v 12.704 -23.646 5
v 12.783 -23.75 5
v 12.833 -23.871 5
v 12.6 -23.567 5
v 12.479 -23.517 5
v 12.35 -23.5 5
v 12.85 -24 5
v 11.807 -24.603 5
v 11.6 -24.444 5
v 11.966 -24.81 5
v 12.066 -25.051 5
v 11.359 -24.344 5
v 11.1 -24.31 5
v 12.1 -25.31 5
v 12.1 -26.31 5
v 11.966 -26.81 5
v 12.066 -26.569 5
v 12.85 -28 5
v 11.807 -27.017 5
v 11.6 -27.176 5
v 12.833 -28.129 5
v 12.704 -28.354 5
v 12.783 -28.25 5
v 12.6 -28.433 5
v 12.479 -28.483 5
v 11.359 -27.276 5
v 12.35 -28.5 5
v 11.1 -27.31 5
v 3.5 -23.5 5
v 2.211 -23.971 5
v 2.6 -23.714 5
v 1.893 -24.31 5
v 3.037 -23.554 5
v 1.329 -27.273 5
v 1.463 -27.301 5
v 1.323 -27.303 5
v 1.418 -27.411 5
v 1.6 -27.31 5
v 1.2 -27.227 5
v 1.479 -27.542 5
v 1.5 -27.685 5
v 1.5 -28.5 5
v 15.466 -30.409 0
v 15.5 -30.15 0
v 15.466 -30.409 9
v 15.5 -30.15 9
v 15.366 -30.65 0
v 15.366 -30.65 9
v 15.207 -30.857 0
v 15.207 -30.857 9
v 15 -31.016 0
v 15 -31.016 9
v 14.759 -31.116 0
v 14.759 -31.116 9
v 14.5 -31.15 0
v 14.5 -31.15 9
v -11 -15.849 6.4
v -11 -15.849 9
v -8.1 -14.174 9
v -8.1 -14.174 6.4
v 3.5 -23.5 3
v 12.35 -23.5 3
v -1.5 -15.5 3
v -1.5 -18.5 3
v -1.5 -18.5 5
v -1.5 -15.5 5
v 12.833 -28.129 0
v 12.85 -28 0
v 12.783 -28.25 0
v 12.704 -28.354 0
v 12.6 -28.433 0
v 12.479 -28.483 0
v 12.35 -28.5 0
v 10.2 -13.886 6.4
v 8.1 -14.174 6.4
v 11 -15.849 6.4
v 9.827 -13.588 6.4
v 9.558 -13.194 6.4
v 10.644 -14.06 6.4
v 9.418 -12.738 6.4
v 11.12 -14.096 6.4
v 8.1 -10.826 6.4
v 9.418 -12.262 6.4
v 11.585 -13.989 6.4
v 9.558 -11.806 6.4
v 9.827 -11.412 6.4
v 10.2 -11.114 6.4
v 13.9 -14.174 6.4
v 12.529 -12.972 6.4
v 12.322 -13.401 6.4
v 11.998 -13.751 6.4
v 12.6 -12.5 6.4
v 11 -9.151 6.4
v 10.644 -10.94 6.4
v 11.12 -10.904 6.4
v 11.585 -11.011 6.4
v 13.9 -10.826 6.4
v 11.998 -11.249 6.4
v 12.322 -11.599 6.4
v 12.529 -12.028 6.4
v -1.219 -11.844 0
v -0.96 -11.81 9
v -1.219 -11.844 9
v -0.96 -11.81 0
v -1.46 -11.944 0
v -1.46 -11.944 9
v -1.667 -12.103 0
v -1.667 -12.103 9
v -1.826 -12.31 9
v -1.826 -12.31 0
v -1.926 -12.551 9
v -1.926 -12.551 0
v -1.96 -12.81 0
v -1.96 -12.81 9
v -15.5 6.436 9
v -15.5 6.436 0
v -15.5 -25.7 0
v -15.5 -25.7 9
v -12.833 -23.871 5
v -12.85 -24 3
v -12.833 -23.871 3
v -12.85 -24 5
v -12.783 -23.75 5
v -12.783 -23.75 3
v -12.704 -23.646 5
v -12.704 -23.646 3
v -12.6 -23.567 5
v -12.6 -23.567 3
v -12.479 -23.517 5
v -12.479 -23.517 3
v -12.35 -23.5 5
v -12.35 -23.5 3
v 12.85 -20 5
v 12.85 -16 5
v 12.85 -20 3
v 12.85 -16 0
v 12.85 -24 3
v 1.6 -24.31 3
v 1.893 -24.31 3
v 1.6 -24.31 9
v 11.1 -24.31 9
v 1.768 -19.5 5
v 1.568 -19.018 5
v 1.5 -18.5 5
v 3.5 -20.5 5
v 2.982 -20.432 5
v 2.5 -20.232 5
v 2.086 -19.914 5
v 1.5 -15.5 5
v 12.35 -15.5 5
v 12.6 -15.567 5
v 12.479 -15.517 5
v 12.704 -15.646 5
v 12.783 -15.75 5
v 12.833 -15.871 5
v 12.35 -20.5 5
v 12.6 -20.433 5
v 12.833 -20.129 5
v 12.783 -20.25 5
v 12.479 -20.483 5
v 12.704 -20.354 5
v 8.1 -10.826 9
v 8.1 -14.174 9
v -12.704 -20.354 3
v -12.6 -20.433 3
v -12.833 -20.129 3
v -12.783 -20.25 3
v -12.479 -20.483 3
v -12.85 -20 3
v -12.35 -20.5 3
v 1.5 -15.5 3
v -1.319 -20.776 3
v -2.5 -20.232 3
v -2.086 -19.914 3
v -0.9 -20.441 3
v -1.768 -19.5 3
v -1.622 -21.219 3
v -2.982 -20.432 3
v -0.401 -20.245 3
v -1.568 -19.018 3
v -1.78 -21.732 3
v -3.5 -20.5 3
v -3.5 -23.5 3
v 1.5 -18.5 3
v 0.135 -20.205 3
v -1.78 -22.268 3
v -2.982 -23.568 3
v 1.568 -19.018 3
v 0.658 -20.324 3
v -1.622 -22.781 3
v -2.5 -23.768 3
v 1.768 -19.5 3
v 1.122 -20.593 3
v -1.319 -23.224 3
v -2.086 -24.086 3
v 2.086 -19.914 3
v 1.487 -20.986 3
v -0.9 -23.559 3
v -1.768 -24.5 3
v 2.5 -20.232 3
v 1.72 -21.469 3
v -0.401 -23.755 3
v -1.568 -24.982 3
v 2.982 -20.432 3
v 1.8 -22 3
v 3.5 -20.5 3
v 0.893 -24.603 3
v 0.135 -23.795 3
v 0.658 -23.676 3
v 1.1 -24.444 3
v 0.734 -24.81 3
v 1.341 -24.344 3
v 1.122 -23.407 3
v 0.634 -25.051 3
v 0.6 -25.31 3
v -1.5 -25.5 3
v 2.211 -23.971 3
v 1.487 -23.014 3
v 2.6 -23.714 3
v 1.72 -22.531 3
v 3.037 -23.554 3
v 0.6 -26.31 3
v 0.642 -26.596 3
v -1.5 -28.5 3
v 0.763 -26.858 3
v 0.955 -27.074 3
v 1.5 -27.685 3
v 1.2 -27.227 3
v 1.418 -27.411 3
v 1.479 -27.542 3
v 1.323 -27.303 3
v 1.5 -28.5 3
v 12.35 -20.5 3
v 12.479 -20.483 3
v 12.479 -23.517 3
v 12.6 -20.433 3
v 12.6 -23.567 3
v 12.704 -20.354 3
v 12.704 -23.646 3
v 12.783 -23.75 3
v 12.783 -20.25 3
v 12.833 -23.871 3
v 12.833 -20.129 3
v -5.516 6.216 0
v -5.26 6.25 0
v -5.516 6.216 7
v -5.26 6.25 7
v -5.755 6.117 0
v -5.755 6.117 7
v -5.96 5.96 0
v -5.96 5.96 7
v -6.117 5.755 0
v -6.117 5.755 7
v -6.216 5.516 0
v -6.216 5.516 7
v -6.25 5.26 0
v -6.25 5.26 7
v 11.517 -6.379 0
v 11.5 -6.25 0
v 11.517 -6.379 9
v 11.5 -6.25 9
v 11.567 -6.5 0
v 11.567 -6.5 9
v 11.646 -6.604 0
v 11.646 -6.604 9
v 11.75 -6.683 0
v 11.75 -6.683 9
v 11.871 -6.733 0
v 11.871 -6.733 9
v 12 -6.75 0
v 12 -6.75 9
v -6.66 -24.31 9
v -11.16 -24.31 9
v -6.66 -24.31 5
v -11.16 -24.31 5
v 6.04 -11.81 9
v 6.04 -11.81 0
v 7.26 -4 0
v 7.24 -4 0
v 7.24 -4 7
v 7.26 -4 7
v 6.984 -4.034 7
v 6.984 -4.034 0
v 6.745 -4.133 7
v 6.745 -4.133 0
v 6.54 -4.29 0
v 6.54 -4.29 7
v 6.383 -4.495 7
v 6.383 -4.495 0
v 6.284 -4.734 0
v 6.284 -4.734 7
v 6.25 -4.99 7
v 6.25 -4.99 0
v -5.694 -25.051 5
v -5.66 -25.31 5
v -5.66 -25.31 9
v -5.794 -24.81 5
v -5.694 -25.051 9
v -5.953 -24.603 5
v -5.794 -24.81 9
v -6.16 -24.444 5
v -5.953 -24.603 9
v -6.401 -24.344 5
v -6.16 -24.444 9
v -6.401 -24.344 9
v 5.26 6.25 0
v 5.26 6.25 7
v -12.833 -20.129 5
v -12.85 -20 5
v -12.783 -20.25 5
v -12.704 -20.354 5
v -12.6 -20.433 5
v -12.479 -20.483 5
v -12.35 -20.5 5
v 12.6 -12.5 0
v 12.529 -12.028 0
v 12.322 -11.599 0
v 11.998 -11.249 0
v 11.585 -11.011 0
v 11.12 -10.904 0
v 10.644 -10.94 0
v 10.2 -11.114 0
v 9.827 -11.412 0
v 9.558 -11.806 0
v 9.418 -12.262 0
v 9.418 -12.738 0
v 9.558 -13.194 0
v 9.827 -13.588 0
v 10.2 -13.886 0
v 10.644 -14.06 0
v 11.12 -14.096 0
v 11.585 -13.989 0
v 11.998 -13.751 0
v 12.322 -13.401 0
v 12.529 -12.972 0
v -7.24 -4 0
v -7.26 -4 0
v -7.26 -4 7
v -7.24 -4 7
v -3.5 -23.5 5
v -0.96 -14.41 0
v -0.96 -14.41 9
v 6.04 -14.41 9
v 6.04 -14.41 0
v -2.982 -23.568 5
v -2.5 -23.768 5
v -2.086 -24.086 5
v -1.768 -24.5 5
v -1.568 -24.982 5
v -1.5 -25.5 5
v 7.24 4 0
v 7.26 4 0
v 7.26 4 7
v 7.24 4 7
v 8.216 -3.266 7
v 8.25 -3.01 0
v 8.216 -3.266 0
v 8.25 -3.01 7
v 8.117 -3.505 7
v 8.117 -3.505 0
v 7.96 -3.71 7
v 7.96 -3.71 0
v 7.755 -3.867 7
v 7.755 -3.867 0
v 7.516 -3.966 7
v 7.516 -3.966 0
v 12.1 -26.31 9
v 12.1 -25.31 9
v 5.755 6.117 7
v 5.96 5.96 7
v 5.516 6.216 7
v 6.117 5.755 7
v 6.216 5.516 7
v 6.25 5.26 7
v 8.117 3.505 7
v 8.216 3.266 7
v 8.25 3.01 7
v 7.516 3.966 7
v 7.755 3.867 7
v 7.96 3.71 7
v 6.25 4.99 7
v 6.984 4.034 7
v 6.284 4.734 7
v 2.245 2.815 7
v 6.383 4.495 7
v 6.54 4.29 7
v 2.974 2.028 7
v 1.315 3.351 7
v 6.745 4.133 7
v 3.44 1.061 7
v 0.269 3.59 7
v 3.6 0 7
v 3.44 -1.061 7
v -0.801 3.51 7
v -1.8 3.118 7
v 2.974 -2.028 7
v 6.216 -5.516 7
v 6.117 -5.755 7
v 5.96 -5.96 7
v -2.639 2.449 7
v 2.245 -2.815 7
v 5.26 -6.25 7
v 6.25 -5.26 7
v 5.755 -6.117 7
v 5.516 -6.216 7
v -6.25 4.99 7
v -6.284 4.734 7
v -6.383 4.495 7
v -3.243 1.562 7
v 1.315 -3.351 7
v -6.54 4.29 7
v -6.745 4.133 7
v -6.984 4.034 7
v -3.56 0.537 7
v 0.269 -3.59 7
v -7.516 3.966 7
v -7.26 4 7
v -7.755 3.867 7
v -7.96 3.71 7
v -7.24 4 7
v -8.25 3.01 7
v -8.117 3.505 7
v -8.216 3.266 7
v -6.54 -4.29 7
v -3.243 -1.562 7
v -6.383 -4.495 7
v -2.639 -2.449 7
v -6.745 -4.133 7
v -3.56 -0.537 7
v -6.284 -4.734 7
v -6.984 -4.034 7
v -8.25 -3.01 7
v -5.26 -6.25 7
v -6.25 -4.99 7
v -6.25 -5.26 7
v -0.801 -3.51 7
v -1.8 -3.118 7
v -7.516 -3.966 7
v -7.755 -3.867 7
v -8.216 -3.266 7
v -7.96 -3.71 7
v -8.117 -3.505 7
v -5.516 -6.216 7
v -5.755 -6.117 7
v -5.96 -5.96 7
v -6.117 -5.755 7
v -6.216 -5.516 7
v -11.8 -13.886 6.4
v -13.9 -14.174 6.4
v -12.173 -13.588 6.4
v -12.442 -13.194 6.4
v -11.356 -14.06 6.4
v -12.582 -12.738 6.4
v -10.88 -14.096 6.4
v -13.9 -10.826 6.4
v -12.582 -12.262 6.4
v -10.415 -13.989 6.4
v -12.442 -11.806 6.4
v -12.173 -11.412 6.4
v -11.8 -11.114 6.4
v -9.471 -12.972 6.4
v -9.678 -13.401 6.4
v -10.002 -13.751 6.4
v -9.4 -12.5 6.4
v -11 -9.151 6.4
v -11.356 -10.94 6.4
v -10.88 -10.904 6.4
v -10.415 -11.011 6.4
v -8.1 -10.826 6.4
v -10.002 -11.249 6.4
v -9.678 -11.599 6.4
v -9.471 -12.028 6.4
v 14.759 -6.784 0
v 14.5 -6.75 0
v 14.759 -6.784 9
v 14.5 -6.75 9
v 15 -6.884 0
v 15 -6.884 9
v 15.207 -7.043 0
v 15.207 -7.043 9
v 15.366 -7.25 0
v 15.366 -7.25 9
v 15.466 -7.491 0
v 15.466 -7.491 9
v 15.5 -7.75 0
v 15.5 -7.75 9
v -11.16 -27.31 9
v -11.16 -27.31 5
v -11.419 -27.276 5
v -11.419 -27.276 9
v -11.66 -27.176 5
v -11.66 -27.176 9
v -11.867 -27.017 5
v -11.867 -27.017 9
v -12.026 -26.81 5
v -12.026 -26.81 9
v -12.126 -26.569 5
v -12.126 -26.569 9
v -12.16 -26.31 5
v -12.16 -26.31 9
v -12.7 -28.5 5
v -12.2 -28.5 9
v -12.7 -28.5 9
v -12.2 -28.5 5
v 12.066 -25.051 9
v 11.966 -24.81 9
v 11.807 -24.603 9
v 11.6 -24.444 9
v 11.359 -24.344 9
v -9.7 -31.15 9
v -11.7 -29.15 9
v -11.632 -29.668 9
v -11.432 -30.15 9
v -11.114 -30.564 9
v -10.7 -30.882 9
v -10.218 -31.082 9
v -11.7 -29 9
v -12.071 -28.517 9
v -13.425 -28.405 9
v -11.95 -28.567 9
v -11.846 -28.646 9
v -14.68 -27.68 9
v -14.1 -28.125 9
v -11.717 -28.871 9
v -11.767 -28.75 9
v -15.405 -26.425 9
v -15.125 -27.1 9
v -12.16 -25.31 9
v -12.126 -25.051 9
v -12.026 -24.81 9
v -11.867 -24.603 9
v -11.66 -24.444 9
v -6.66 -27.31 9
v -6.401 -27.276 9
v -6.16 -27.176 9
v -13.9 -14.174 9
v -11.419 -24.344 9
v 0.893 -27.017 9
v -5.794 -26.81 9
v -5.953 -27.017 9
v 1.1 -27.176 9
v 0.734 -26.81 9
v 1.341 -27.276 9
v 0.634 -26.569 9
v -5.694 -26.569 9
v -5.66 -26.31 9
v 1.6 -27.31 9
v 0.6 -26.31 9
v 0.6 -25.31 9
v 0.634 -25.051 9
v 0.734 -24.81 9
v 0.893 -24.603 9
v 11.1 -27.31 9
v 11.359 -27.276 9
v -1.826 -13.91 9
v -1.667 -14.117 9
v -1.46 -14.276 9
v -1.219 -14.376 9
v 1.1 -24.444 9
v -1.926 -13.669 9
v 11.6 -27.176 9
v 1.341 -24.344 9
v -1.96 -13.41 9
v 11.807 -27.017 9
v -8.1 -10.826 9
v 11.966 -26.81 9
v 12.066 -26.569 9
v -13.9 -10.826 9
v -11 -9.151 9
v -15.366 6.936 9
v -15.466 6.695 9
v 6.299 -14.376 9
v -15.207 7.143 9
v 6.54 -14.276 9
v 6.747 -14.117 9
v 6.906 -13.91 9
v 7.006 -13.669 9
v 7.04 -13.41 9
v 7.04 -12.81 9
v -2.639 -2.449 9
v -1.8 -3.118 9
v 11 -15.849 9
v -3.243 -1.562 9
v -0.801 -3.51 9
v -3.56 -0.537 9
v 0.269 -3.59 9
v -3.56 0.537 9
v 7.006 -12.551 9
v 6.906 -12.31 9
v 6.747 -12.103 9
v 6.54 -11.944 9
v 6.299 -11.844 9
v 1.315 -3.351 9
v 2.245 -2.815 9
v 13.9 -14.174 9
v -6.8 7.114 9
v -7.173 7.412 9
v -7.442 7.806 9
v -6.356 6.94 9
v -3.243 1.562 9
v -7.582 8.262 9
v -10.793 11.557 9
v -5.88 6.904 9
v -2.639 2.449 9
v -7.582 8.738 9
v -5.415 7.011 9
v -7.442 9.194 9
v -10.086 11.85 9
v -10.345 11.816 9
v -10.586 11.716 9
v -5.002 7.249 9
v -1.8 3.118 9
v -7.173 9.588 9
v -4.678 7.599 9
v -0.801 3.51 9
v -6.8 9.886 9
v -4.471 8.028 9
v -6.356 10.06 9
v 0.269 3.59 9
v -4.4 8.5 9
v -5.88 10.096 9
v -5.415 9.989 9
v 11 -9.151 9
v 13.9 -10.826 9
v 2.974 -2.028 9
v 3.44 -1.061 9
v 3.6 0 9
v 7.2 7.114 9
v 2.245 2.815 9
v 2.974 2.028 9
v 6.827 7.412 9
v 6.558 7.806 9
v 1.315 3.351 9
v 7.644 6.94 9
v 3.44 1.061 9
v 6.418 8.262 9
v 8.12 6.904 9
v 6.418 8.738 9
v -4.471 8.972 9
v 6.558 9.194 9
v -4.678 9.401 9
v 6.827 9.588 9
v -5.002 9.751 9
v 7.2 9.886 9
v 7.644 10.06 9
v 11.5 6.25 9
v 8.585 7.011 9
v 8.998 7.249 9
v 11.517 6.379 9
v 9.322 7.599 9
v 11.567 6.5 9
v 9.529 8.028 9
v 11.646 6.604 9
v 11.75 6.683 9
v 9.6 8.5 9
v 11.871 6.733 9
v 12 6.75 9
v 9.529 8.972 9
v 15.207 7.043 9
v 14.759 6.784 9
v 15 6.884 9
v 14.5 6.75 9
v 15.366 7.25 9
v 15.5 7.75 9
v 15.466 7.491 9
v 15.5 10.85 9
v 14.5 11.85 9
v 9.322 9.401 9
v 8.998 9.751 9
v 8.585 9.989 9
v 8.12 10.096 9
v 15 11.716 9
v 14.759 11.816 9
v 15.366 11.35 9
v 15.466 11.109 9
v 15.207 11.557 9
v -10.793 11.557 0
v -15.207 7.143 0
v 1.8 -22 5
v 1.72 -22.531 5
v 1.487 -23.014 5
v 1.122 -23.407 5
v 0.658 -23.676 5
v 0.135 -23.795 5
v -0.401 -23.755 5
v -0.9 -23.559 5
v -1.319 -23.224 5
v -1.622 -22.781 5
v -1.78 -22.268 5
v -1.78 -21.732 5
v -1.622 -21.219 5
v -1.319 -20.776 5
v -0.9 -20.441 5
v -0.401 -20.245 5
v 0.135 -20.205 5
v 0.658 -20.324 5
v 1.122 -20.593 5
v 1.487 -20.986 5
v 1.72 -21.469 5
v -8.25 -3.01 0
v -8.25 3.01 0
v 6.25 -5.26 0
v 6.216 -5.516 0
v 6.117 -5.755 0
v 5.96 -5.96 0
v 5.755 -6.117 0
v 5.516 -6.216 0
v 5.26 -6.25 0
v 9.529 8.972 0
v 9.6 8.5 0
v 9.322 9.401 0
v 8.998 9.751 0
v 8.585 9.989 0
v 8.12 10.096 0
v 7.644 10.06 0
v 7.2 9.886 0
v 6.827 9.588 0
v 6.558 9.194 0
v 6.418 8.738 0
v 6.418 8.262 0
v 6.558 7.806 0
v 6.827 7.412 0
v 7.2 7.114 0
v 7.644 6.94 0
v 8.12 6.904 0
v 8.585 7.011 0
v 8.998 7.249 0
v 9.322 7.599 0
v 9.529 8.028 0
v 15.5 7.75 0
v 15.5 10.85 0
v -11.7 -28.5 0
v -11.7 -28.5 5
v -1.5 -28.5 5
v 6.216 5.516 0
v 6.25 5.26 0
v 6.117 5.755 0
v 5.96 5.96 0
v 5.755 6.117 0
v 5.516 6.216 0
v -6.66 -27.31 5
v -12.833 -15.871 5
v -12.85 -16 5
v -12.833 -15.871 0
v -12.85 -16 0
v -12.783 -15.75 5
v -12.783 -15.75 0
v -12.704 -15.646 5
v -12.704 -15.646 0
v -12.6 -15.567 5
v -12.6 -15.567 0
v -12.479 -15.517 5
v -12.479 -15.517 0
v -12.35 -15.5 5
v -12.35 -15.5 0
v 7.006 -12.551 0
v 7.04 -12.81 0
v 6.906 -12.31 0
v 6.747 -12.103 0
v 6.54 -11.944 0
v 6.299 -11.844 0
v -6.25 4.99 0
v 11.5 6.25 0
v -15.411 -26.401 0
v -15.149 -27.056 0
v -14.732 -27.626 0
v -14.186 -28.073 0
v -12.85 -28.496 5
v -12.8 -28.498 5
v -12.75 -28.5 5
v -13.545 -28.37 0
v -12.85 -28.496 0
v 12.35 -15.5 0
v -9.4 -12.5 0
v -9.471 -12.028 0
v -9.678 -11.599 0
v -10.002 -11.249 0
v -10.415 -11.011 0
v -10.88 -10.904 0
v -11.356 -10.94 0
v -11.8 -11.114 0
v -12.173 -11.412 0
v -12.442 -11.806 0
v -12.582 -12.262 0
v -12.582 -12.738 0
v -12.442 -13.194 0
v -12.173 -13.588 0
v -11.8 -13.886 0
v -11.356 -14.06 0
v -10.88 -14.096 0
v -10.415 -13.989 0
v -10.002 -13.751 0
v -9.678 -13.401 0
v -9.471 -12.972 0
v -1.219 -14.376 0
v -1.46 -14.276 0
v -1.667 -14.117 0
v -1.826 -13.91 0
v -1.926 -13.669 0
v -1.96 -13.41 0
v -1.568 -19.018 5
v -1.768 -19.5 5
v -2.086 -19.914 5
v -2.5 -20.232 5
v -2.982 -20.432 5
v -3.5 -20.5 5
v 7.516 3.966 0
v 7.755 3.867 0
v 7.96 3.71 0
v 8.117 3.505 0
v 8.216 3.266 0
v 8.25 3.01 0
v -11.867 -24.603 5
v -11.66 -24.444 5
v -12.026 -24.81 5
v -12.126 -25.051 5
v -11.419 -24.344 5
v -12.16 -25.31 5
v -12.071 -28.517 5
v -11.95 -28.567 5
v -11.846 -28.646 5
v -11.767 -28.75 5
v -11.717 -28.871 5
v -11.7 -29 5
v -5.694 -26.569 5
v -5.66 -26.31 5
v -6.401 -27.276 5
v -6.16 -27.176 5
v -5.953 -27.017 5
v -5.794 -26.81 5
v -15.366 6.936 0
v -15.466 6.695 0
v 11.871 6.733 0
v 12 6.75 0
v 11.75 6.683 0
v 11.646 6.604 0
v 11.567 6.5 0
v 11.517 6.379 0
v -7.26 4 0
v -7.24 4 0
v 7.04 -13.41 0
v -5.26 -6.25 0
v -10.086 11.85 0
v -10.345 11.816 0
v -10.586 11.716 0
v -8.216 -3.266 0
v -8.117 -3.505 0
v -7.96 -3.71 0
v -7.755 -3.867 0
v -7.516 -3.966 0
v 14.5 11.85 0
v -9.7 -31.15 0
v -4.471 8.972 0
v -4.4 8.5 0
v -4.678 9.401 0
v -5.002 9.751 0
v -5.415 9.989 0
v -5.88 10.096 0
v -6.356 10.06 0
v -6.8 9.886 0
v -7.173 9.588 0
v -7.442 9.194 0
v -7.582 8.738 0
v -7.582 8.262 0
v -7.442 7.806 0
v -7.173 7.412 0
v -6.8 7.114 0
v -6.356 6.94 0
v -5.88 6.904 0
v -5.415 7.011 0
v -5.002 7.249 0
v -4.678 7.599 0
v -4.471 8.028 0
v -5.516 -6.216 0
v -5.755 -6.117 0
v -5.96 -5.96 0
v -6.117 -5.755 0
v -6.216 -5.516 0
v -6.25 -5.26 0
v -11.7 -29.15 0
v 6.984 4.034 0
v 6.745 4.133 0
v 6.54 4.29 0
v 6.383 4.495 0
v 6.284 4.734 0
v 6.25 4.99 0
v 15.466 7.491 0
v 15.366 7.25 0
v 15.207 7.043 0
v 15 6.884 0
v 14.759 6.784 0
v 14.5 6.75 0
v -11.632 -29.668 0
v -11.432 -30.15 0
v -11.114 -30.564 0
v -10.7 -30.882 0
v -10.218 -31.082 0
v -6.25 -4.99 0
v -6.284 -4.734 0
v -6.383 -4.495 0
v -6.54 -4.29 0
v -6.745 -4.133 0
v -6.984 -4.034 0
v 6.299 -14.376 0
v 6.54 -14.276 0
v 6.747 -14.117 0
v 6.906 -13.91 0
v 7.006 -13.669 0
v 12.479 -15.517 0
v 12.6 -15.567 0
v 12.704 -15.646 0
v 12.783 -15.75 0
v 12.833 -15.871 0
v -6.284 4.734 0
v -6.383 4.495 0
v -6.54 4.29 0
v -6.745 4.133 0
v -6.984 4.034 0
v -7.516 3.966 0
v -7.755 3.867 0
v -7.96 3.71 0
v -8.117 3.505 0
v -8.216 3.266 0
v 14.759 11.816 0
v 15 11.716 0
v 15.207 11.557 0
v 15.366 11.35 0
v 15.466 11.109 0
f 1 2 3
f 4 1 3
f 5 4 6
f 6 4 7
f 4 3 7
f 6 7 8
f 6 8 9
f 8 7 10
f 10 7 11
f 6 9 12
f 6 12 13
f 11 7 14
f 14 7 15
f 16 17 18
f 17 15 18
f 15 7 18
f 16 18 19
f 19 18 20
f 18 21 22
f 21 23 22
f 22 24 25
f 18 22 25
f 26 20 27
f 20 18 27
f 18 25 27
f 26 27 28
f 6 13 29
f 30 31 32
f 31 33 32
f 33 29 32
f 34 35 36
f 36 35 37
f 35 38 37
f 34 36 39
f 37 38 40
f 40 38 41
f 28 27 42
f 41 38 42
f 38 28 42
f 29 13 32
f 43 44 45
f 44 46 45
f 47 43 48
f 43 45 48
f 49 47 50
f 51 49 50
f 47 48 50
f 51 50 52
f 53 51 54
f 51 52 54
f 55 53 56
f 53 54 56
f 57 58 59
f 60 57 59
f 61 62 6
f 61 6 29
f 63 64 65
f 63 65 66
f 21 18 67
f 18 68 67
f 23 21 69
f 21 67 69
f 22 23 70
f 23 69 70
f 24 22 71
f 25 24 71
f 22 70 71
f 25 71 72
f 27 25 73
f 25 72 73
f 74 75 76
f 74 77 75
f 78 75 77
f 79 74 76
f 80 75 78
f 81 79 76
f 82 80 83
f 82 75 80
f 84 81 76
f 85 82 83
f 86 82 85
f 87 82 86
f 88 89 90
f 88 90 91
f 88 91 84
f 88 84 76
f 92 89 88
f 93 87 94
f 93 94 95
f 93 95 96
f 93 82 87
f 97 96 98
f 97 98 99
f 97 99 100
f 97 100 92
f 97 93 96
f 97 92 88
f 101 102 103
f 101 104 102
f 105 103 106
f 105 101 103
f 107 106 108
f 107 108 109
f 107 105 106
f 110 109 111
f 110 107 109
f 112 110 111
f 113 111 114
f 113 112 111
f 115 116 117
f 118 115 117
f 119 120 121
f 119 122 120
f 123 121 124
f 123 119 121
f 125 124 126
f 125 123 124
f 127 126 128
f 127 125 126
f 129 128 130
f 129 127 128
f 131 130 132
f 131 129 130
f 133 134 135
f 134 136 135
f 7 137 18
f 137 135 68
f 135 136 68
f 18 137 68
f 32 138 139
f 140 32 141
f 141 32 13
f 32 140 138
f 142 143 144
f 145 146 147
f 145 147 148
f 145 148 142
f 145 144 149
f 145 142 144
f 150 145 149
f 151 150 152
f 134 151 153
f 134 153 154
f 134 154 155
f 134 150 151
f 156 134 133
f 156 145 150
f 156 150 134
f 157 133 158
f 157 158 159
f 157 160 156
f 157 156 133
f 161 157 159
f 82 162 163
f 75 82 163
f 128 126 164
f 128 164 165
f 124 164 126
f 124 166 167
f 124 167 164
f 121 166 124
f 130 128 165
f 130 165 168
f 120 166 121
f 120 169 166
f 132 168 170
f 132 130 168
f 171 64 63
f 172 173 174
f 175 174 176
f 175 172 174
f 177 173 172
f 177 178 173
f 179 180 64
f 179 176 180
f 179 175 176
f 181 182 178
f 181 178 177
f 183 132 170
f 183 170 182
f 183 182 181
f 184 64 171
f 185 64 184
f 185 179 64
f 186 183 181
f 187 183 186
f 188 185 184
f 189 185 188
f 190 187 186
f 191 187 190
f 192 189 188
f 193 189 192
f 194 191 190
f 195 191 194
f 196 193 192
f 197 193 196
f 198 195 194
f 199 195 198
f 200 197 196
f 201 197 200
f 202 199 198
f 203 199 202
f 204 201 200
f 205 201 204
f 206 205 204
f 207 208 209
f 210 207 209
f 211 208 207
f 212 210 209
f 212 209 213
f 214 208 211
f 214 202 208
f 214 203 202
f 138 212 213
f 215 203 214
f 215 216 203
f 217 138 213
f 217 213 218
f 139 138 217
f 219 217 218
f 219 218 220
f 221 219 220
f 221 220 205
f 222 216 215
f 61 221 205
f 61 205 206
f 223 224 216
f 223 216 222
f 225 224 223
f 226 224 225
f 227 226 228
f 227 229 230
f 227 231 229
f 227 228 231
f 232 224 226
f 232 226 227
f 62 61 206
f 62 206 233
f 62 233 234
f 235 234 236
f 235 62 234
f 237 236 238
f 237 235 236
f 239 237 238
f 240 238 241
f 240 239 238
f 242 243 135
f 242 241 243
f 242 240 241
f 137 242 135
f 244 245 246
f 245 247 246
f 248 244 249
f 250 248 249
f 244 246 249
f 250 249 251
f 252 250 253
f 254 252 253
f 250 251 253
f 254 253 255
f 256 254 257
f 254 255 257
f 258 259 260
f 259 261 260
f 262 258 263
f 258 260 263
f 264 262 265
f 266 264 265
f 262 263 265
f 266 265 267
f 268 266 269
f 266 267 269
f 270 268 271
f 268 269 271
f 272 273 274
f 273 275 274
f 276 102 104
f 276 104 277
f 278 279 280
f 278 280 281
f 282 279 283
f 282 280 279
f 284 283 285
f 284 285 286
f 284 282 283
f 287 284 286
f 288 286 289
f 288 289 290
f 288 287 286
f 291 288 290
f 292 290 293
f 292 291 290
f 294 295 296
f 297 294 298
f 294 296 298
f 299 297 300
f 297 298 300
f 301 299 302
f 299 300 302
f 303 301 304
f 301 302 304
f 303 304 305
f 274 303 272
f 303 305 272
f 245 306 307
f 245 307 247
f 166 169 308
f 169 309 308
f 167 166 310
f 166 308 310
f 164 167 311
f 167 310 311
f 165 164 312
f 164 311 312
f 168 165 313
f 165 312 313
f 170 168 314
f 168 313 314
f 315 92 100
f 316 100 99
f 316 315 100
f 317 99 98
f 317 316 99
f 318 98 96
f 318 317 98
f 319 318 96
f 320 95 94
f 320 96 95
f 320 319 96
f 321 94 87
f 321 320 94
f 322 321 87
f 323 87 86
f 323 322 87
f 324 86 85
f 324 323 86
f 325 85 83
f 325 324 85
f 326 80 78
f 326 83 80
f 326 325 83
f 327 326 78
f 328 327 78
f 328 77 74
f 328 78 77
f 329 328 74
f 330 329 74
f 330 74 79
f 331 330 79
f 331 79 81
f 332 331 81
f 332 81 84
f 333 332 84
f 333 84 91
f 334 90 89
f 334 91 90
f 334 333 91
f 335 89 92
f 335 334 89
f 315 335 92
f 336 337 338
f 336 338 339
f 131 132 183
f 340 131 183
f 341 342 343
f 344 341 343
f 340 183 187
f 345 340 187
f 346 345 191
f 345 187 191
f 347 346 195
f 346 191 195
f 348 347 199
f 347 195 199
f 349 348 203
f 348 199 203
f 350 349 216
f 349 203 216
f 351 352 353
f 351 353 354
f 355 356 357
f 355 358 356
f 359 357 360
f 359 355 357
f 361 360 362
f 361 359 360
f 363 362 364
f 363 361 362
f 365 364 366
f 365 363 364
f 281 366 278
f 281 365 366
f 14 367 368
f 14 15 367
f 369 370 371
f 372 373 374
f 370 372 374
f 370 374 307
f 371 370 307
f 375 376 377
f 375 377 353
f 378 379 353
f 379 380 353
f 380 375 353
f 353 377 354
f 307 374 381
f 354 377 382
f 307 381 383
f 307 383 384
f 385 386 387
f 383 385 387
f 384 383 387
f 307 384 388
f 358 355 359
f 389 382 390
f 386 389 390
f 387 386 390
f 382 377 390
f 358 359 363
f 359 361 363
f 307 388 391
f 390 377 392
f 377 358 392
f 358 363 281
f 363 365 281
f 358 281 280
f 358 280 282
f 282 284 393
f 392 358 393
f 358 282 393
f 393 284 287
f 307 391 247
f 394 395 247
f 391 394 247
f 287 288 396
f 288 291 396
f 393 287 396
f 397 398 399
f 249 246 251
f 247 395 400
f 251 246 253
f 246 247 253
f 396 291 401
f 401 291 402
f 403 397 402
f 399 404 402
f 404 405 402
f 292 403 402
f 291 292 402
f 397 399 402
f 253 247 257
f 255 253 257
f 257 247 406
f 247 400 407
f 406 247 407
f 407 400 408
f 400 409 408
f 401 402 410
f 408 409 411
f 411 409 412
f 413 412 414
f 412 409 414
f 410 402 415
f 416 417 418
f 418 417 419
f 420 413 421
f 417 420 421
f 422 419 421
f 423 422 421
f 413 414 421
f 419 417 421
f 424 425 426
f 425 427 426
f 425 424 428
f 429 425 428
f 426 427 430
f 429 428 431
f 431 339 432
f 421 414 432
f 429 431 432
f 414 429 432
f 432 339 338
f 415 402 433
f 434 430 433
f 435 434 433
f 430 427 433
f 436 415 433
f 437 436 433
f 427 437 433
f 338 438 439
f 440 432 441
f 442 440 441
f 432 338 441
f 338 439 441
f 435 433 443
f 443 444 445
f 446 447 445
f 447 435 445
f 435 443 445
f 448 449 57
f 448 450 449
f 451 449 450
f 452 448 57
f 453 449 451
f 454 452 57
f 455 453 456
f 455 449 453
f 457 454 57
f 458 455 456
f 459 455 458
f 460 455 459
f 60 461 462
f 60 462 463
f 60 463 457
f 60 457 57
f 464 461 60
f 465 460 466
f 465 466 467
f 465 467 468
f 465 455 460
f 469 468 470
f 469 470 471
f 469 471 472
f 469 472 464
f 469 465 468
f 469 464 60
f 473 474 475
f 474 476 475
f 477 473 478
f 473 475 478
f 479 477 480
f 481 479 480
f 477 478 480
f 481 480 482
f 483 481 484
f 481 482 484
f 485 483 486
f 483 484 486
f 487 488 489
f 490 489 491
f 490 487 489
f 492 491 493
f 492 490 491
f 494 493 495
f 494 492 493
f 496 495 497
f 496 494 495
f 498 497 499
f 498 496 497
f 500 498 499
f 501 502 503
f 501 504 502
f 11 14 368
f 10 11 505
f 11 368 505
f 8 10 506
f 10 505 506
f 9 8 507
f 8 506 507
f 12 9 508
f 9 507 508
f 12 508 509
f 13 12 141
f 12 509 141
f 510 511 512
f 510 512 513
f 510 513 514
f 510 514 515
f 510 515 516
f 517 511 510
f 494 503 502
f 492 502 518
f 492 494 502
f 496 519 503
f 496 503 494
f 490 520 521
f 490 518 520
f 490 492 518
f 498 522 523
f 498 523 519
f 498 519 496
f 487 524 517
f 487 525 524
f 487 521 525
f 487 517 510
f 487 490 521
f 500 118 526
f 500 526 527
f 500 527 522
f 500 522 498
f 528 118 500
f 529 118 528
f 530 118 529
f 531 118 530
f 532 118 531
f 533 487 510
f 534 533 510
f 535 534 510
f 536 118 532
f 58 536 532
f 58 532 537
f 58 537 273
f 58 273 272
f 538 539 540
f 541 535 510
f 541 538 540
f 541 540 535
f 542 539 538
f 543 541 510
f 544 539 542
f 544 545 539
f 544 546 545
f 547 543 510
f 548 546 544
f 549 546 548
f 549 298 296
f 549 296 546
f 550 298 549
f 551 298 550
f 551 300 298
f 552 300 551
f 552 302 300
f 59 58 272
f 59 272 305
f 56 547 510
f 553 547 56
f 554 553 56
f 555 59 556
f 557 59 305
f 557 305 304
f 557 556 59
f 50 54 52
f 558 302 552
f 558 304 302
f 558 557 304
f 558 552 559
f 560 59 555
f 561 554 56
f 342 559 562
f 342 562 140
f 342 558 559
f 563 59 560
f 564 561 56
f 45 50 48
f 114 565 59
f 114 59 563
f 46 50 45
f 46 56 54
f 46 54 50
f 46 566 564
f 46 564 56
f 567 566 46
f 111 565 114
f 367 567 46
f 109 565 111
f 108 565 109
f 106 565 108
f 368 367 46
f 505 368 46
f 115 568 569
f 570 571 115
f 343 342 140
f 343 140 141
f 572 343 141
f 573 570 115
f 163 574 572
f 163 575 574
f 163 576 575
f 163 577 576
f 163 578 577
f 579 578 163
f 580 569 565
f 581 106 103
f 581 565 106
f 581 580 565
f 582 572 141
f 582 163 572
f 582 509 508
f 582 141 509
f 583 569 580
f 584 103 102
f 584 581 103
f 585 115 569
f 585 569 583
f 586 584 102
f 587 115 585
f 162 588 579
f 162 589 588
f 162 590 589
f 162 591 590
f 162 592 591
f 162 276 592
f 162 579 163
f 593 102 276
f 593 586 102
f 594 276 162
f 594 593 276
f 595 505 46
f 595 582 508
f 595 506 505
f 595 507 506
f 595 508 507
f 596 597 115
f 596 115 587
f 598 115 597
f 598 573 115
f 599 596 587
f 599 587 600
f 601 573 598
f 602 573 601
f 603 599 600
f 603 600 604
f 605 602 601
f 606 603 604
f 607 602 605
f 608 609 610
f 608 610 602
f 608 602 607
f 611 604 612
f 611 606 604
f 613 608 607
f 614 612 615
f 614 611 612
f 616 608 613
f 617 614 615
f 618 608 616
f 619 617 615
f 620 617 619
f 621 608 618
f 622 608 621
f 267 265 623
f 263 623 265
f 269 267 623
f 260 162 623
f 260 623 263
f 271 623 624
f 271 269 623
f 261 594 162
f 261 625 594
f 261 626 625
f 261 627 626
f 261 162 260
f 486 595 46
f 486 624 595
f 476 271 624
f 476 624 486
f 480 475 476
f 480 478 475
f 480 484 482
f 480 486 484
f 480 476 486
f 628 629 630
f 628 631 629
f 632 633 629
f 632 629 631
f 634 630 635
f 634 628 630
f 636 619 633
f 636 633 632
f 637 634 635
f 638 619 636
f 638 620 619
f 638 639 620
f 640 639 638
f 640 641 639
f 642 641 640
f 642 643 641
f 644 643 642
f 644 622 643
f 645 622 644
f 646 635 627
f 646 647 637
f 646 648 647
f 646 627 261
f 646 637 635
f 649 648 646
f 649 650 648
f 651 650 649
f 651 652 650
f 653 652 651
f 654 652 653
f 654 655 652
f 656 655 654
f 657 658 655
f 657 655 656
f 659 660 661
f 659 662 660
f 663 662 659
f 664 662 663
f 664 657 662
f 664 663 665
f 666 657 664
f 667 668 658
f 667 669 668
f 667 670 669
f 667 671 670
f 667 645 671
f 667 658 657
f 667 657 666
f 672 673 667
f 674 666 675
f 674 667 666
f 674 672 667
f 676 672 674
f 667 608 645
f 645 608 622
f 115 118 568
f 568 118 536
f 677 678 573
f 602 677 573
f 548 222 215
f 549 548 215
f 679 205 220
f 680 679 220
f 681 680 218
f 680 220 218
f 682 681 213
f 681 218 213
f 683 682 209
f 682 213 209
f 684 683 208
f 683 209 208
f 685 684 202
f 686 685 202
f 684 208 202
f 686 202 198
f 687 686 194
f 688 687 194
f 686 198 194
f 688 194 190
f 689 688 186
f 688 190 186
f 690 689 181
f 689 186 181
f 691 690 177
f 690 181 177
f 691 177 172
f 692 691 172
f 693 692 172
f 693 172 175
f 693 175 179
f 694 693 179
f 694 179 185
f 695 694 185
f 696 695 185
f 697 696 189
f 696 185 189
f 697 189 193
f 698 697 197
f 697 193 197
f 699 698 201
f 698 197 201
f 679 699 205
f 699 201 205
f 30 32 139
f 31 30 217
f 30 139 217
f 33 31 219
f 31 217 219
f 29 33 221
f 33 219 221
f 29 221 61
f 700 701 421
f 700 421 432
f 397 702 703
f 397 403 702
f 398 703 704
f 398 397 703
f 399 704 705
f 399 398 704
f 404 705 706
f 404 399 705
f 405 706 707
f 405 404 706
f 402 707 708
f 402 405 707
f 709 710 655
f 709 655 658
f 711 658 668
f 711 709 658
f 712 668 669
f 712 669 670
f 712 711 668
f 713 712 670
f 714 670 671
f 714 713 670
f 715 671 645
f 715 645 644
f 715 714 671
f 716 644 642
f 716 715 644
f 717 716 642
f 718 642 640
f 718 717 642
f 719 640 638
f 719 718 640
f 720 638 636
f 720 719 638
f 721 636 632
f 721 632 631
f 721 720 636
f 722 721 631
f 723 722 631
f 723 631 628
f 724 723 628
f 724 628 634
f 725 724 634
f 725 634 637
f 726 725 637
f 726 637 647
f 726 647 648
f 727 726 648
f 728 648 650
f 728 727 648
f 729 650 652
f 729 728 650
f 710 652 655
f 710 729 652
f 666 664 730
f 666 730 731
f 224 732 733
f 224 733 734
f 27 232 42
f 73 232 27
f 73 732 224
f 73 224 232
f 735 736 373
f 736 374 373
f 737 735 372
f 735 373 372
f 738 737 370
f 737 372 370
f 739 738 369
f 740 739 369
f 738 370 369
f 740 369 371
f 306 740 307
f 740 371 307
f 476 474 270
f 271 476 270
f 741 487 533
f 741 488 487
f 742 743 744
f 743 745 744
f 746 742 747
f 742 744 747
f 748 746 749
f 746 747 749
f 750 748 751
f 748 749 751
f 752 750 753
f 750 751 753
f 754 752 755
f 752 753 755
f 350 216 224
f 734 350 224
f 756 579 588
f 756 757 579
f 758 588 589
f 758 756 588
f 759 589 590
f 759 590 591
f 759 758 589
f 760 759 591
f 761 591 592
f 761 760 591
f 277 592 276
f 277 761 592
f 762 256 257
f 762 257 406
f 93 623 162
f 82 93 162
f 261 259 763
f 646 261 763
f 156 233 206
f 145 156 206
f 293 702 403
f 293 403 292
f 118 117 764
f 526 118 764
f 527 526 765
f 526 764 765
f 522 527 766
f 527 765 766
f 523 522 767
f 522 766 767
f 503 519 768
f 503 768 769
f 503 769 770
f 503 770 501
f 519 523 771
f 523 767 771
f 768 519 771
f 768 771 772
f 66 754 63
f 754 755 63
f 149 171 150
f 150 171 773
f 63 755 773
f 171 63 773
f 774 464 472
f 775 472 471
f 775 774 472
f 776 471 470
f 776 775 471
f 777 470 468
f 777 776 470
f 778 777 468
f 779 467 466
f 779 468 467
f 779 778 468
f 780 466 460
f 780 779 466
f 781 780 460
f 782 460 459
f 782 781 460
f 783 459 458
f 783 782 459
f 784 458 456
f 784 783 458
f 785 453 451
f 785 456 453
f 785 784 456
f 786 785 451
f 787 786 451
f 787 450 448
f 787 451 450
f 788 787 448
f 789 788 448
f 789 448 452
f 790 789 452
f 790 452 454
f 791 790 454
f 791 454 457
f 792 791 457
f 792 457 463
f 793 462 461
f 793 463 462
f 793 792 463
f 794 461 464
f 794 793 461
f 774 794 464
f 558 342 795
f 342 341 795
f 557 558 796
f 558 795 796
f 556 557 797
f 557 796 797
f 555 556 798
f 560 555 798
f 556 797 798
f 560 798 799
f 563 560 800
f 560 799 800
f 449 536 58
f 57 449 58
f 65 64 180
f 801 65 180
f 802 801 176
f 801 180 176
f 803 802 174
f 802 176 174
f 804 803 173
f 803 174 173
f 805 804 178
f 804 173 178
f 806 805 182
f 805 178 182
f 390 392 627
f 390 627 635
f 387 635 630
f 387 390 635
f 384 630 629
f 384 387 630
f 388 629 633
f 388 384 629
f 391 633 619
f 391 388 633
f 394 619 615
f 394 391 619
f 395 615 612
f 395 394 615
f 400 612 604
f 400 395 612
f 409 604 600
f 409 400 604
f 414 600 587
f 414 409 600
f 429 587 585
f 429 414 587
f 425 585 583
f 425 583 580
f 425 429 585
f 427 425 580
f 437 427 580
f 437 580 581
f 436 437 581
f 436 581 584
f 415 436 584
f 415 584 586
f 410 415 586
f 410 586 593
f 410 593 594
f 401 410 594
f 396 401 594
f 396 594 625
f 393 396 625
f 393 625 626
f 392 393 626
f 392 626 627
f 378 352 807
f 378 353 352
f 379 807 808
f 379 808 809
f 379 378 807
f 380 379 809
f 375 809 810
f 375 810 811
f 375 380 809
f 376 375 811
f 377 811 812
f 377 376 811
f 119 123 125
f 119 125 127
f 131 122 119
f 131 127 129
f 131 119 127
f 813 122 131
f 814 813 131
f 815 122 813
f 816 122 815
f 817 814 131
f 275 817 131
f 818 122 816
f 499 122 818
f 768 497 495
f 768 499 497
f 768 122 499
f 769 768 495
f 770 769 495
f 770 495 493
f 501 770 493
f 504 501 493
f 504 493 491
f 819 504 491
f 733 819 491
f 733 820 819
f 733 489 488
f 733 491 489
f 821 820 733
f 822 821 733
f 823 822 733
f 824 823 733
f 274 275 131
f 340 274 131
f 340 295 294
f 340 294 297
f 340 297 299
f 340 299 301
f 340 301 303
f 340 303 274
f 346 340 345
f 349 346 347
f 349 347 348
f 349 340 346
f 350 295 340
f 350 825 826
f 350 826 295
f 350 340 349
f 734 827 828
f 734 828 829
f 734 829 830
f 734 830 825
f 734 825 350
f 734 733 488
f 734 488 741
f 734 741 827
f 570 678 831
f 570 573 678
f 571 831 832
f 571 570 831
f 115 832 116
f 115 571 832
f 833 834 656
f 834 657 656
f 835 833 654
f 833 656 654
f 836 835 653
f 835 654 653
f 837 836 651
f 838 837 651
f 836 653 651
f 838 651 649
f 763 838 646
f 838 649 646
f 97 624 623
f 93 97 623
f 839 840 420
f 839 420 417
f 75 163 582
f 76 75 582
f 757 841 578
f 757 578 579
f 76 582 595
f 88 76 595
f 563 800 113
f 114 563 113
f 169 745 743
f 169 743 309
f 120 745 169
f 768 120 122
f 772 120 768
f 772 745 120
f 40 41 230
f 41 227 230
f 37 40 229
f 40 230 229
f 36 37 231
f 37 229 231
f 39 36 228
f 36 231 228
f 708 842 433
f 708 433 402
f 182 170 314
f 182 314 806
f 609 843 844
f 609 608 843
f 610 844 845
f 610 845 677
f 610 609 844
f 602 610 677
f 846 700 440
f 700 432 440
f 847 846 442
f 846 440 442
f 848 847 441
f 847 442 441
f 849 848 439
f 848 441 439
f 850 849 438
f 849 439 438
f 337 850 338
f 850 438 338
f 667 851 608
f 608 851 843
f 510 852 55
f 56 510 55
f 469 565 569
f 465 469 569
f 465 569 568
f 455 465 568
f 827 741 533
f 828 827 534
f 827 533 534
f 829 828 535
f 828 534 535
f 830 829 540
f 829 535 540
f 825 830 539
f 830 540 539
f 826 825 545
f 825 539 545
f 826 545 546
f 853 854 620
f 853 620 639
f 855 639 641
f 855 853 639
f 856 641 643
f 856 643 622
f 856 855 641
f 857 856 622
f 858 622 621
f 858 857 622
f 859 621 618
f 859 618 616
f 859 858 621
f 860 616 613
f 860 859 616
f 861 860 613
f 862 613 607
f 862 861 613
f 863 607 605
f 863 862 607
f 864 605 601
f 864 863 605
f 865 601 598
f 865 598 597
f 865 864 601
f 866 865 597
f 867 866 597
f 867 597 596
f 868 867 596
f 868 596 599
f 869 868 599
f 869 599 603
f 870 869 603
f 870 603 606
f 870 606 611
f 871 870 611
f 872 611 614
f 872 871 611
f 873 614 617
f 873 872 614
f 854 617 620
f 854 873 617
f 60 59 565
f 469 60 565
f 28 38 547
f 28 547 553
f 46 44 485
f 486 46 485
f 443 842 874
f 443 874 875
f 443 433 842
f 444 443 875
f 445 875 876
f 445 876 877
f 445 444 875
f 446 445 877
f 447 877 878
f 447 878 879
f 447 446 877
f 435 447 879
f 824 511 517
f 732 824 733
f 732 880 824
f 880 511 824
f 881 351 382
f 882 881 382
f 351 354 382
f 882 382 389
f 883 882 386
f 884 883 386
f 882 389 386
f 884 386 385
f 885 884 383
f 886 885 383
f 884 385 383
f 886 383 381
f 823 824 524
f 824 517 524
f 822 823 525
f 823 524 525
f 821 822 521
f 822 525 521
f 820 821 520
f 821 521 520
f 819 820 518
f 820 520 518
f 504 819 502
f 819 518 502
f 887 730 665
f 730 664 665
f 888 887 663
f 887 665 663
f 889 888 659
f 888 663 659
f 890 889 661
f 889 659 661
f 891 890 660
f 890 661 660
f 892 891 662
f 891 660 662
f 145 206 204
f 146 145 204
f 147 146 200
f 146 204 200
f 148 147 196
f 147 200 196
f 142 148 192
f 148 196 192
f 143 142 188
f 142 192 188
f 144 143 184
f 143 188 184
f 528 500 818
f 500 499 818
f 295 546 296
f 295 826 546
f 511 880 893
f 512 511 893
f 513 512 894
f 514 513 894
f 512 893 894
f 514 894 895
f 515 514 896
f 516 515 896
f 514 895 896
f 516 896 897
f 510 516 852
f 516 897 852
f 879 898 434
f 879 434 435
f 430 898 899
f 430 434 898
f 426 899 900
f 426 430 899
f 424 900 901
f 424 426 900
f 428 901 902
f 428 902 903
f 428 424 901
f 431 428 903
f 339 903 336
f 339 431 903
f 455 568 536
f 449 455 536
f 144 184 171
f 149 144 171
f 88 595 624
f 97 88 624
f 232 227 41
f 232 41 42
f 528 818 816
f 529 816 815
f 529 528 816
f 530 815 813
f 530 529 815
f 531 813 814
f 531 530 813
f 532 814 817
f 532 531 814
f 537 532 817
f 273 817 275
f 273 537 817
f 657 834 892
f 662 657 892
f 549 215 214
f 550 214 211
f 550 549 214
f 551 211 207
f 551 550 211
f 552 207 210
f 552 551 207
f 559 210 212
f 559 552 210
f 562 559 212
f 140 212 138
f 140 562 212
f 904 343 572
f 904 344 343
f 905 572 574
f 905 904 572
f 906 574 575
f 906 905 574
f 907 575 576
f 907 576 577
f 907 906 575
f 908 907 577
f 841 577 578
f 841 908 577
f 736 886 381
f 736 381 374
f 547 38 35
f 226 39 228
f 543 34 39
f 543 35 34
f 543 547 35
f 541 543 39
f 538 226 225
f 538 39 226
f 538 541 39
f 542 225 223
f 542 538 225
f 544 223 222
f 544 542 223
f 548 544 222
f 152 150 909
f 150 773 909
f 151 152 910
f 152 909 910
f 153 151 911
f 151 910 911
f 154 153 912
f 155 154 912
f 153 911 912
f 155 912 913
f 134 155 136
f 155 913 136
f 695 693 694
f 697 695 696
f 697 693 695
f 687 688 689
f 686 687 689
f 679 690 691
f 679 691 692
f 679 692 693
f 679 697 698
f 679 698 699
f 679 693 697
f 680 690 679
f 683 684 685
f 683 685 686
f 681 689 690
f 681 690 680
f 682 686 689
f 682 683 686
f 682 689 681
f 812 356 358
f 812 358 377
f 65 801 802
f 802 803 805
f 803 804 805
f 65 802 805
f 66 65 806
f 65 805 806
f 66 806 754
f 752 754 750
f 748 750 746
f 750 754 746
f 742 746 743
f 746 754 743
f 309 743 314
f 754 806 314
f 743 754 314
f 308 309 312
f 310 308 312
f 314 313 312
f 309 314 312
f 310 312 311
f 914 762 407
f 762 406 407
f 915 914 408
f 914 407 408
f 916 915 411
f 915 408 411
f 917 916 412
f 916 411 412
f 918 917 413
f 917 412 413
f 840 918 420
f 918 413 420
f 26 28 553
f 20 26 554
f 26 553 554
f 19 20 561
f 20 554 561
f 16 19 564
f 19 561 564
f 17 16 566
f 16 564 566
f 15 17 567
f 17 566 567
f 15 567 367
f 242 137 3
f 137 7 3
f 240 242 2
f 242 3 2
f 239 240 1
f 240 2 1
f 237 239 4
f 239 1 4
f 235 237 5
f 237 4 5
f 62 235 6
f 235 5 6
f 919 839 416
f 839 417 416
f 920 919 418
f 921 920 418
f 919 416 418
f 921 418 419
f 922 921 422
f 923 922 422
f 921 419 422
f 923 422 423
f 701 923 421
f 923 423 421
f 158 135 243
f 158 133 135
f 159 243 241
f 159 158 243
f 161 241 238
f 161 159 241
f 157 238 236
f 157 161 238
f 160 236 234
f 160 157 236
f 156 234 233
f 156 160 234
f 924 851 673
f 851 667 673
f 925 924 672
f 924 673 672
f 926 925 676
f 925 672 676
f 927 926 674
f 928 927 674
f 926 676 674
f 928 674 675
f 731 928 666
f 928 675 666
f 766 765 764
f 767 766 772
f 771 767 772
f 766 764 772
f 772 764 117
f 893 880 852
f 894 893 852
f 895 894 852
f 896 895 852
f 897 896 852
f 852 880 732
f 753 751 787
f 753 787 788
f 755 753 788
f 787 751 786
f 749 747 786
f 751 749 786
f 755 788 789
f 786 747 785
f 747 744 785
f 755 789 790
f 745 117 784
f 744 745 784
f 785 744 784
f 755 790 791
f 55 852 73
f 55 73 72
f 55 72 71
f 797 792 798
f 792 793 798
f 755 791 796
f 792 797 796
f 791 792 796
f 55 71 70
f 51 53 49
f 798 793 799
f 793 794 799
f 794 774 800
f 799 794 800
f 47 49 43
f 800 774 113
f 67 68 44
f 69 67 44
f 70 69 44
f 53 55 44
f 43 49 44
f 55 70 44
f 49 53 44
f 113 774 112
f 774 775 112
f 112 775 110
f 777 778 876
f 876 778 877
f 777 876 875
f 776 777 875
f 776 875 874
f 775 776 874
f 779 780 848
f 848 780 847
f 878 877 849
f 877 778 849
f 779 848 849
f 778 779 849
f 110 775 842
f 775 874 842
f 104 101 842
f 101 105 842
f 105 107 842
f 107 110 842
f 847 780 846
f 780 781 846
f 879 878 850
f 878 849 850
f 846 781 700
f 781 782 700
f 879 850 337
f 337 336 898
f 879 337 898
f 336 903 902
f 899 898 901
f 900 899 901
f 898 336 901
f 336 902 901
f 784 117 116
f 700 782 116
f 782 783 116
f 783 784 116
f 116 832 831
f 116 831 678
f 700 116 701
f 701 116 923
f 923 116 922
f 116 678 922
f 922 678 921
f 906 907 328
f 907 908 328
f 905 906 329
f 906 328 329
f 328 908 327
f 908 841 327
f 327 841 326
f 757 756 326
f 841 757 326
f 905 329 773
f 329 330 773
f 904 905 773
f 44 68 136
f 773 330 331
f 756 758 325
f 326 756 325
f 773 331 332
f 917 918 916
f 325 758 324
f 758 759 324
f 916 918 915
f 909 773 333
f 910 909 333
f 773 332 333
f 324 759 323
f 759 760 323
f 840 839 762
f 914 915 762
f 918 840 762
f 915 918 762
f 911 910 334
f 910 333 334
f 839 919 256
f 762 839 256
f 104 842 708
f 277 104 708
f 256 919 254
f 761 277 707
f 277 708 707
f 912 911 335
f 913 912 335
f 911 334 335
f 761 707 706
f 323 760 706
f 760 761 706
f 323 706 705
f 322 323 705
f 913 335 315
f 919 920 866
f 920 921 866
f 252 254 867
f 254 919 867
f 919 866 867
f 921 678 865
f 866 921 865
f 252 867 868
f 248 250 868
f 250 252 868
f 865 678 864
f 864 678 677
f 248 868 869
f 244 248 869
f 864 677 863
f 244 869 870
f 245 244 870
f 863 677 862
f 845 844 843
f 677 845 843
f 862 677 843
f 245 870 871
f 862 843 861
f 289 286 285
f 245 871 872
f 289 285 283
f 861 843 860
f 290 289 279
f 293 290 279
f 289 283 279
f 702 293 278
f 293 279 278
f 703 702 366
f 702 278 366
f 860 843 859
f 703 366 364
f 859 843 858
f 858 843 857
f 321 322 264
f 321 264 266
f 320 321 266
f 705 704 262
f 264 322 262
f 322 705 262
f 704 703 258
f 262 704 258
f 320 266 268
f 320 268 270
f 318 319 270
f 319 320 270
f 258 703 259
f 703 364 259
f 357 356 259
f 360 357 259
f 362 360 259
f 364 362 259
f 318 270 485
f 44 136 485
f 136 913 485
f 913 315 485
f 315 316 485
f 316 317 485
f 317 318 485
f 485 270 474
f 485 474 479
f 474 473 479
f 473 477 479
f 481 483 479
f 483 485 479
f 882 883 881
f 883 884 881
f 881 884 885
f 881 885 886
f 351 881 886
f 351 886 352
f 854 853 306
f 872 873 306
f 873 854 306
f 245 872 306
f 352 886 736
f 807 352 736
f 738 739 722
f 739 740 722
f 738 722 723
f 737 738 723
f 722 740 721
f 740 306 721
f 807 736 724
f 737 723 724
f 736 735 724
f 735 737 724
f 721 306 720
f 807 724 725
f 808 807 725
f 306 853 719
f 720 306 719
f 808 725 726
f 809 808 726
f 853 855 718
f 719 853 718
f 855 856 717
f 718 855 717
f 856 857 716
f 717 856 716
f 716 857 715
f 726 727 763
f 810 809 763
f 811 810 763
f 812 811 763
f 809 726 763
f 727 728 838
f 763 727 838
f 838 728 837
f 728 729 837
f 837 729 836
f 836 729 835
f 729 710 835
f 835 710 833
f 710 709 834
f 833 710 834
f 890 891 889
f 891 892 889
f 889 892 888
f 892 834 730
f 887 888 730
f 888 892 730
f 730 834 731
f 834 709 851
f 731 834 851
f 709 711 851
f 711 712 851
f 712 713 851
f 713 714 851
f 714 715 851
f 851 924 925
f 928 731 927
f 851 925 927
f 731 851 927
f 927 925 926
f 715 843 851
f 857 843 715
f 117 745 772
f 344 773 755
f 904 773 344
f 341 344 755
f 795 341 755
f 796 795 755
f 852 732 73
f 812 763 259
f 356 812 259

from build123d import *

# Parameters (mm, degrees)
SKETCH_R        = 3.6
SKETCH_R_2      = 1.6
SKETCH_W        = 6.5
SKETCH_H        = 3
SKETCH_W_2      = 11.5
PAD_DEPTH       = 9
POCKET_DEPTH    = 2.6
POCKET001_DEPTH = 7
SKETCH003_W     = 25.7
SKETCH003_H     = 13
POCKET002_DEPTH = 3
SKETCH004_R     = 1.8
POCKET003_DEPTH = 2
SKETCH005_W     = 9
SKETCH005_H     = 2.6
POCKET004_DEPTH = 9.001
CHAMFER_SIZE    = 5
FILLET_R        = 1
FILLET001_R     = 0.99
FILLET002_R     = 0.5


with BuildPart() as part:
    # Sketch → Pad (new body)
    with BuildSketch(Plane.XY):
        with BuildLine():
            Line((15.5, -31.15), (15.5, -6.75))
            Line((15.5, -6.75), (11.5, -6.75))
            Line((11.5, -6.75), (11.5, 6.75))
            Line((11.5, 6.75), (15.5, 6.75))
            Line((15.5, 6.75), (15.5, 11.85))
            Line((15.5, 11.85), (-15.5, 11.85))
            Line((-15.5, 11.85), (-15.5, -25.7))
            ThreePointArc((-15.5, -25.7), (-14.679899, -27.679899), (-12.7, -28.5))
            Line((-11.7, -28.5), (-12.7, -28.5))
            Line((-11.7, -29.15), (-11.7, -28.5))
            ThreePointArc((-11.7, -29.15), (-11.114214, -30.564214), (-9.7, -31.15))
            Line((-9.7, -31.15), (15.5, -31.15))
        make_face()
        Circle(SKETCH_R, mode=Mode.SUBTRACT)
        with Locations((-11, -12.5)):
            Circle(SKETCH_R_2, mode=Mode.SUBTRACT)
        with Locations((11, -12.5)):
            Circle(SKETCH_R_2, mode=Mode.SUBTRACT)
        with Locations((-6, 8.5)):
            Circle(SKETCH_R_2, mode=Mode.SUBTRACT)
        with Locations((8, 8.5)):
            Circle(SKETCH_R_2, mode=Mode.SUBTRACT)
        with Locations((-8.91, -25.81)):
            Rectangle(SKETCH_W, SKETCH_H, mode=Mode.SUBTRACT)
        with Locations((6.35, -25.81)):
            Rectangle(SKETCH_W_2, SKETCH_H, mode=Mode.SUBTRACT)
    extrude(amount=PAD_DEPTH)

    # Sketch001 (on Face28 of Pad) → Pocket (cut)
    with BuildSketch(Plane.XY.offset(9)):
        Polygon((-8.1, -14.174316), (-8.1, -10.825684), (-11, -9.151368), (-13.9, -10.825684), (-13.9, -14.174316), (-11, -15.848632), align=None)
        Polygon((13.9, -14.174316), (13.9, -10.825684), (11, -9.151368), (8.1, -10.825684), (8.1, -14.174316), (11, -15.848632), align=None)
    extrude(amount=-POCKET_DEPTH, mode=Mode.SUBTRACT)

    # Sketch002 → Pocket001 (cut)
    with BuildSketch(Plane(origin=(0, 0, 0), x_dir=(1, 0, 0), z_dir=(0, 0, -1))):
        Polygon((8.25, -4), (6.25, -4), (6.25, -6.25), (-6.25, -6.25), (-6.25, -4), (-8.25, -4), (-8.25, 4), (-6.25, 4), (-6.25, 6.25), (6.25, 6.25), (6.25, 4), (8.25, 4), align=None)
    extrude(amount=-POCKET001_DEPTH, mode=Mode.SUBTRACT)

    # Sketch003 → Pocket002 (cut)
    with BuildSketch(Plane(origin=(0, 0, 0), x_dir=(1, 0, 0), z_dir=(0, 0, -1))):
        with Locations((0, 22)):
            Rectangle(SKETCH003_W, SKETCH003_H)
    extrude(amount=-POCKET002_DEPTH, mode=Mode.SUBTRACT)

    # Sketch004 (on Face56 of Pocket002) → Pocket003 (cut)
    with BuildSketch(Plane(origin=(0, 0, 3), x_dir=(1, 0, 0), z_dir=(0, 0, -1))):
        with Locations((0, 22)):
            Circle(SKETCH004_R)
        with BuildLine():
            Line((1.5, 15.5), (12.85, 15.5))
            Line((12.85, 15.5), (12.85, 20.5))
            Line((12.85, 20.5), (3.5, 20.5))
            ThreePointArc((3.5, 20.5), (2.085786, 19.914214), (1.5, 18.5))
            Line((1.5, 18.5), (1.5, 15.5))
        make_face()
        with BuildLine():
            Line((-1.5, 15.5), (-12.85, 15.5))
            Line((-12.85, 15.5), (-12.85, 20.5))
            Line((-12.85, 20.5), (-3.5, 20.5))
            ThreePointArc((-1.5, 18.5), (-2.085786, 19.914214), (-3.5, 20.5))
            Line((-1.5, 18.5), (-1.5, 15.5))
        make_face()
        with BuildLine():
            Line((12.85, 23.5), (3.5, 23.5))
            ThreePointArc((1.5, 25.5), (2.085786, 24.085786), (3.5, 23.5))
            Line((1.5, 25.5), (1.5, 28.5))
            Line((1.5, 28.5), (12.85, 28.5))
            Line((12.85, 28.5), (12.85, 23.5))
        make_face()
        with BuildLine():
            Line((-12.85, 23.5), (-3.5, 23.5))
            ThreePointArc((-3.5, 23.5), (-2.085786, 24.085786), (-1.5, 25.5))
            Line((-1.5, 25.5), (-1.5, 28.5))
            Line((-1.5, 28.5), (-12.85, 28.5))
            Line((-12.85, 28.5), (-12.85, 23.5))
        make_face()
    extrude(amount=-POCKET003_DEPTH, mode=Mode.SUBTRACT)

    # Sketch005 (on Face5 of Pocket003) → Pocket004 (cut, through all)
    with BuildSketch(Plane.XY.offset(9)):
        with Locations((2.54, -13.11)):
            Rectangle(SKETCH005_W, SKETCH005_H)
    extrude(amount=-POCKET004_DEPTH, mode=Mode.SUBTRACT)

    # Chamfer
    chamfer_edges = [part.edges().sort_by_distance(p)[0] for p in [
        (-15.5, 11.85, 4.5),
    ]]
    chamfer(chamfer_edges, length=CHAMFER_SIZE)

    # Fillet
    fillet_edges = [part.edges().sort_by_distance(p)[0] for p in [
        (-10.5, 11.85, 4.5),
        (-15.5, 6.85, 4.5),
        (15.5, 11.85, 4.5),
        (15.5, -6.75, 4.5),
        (15.5, 6.75, 4.5),
        (15.5, -31.15, 4.5),
        (-12.16, -24.31, 7),
        (-5.66, -24.31, 7),
        (-5.66, -27.31, 7),
        (12.1, -27.31, 7),
        (12.1, -24.31, 7),
        (0.6, -24.31, 6),
        (0.6, -27.31, 6),
        (-12.16, -27.31, 7),
        (-1.96, -11.81, 4.5),
        (7.04, -11.81, 4.5),
        (7.04, -14.41, 4.5),
        (-1.96, -14.41, 4.5),
    ]]
    fillet(fillet_edges, radius=FILLET_R)

    # Fillet001
    fillet001_edges = [part.edges().sort_by_distance(p)[0] for p in [
        (-6.25, -4, 3.5),
        (-8.25, -4, 3.5),
        (-6.25, -6.25, 3.5),
        (6.25, -6.25, 3.5),
        (6.25, -4, 3.5),
        (8.25, -4, 3.5),
        (-8.25, 4, 3.5),
        (-6.25, 4, 3.5),
        (-6.25, 6.25, 3.5),
        (8.25, 4, 3.5),
        (6.25, 4, 3.5),
        (6.25, 6.25, 3.5),
    ]]
    fillet(fillet001_edges, radius=FILLET001_R)

    # Fillet002
    fillet002_edges = [part.edges().sort_by_distance(p)[0] for p in [
        (11.5, 6.75, 4.5),
        (11.5, -6.75, 4.5),
        (-12.85, -15.5, 4),
        (-12.85, -15.5, 1.5),
        (-12.85, -20.5, 4),
        (-12.85, -23.5, 4),
        (12.85, -20.5, 4),
        (12.85, -15.5, 4),
        (12.85, -15.5, 1.5),
        (12.85, -28.5, 4),
        (12.85, -28.5, 1.5),
        (12.85, -23.5, 4),
        (1.5, -27.304987, 4),
        (-11.7, -28.5, 7),
    ]]
    fillet(fillet002_edges, radius=FILLET002_R)


solid = part.part
